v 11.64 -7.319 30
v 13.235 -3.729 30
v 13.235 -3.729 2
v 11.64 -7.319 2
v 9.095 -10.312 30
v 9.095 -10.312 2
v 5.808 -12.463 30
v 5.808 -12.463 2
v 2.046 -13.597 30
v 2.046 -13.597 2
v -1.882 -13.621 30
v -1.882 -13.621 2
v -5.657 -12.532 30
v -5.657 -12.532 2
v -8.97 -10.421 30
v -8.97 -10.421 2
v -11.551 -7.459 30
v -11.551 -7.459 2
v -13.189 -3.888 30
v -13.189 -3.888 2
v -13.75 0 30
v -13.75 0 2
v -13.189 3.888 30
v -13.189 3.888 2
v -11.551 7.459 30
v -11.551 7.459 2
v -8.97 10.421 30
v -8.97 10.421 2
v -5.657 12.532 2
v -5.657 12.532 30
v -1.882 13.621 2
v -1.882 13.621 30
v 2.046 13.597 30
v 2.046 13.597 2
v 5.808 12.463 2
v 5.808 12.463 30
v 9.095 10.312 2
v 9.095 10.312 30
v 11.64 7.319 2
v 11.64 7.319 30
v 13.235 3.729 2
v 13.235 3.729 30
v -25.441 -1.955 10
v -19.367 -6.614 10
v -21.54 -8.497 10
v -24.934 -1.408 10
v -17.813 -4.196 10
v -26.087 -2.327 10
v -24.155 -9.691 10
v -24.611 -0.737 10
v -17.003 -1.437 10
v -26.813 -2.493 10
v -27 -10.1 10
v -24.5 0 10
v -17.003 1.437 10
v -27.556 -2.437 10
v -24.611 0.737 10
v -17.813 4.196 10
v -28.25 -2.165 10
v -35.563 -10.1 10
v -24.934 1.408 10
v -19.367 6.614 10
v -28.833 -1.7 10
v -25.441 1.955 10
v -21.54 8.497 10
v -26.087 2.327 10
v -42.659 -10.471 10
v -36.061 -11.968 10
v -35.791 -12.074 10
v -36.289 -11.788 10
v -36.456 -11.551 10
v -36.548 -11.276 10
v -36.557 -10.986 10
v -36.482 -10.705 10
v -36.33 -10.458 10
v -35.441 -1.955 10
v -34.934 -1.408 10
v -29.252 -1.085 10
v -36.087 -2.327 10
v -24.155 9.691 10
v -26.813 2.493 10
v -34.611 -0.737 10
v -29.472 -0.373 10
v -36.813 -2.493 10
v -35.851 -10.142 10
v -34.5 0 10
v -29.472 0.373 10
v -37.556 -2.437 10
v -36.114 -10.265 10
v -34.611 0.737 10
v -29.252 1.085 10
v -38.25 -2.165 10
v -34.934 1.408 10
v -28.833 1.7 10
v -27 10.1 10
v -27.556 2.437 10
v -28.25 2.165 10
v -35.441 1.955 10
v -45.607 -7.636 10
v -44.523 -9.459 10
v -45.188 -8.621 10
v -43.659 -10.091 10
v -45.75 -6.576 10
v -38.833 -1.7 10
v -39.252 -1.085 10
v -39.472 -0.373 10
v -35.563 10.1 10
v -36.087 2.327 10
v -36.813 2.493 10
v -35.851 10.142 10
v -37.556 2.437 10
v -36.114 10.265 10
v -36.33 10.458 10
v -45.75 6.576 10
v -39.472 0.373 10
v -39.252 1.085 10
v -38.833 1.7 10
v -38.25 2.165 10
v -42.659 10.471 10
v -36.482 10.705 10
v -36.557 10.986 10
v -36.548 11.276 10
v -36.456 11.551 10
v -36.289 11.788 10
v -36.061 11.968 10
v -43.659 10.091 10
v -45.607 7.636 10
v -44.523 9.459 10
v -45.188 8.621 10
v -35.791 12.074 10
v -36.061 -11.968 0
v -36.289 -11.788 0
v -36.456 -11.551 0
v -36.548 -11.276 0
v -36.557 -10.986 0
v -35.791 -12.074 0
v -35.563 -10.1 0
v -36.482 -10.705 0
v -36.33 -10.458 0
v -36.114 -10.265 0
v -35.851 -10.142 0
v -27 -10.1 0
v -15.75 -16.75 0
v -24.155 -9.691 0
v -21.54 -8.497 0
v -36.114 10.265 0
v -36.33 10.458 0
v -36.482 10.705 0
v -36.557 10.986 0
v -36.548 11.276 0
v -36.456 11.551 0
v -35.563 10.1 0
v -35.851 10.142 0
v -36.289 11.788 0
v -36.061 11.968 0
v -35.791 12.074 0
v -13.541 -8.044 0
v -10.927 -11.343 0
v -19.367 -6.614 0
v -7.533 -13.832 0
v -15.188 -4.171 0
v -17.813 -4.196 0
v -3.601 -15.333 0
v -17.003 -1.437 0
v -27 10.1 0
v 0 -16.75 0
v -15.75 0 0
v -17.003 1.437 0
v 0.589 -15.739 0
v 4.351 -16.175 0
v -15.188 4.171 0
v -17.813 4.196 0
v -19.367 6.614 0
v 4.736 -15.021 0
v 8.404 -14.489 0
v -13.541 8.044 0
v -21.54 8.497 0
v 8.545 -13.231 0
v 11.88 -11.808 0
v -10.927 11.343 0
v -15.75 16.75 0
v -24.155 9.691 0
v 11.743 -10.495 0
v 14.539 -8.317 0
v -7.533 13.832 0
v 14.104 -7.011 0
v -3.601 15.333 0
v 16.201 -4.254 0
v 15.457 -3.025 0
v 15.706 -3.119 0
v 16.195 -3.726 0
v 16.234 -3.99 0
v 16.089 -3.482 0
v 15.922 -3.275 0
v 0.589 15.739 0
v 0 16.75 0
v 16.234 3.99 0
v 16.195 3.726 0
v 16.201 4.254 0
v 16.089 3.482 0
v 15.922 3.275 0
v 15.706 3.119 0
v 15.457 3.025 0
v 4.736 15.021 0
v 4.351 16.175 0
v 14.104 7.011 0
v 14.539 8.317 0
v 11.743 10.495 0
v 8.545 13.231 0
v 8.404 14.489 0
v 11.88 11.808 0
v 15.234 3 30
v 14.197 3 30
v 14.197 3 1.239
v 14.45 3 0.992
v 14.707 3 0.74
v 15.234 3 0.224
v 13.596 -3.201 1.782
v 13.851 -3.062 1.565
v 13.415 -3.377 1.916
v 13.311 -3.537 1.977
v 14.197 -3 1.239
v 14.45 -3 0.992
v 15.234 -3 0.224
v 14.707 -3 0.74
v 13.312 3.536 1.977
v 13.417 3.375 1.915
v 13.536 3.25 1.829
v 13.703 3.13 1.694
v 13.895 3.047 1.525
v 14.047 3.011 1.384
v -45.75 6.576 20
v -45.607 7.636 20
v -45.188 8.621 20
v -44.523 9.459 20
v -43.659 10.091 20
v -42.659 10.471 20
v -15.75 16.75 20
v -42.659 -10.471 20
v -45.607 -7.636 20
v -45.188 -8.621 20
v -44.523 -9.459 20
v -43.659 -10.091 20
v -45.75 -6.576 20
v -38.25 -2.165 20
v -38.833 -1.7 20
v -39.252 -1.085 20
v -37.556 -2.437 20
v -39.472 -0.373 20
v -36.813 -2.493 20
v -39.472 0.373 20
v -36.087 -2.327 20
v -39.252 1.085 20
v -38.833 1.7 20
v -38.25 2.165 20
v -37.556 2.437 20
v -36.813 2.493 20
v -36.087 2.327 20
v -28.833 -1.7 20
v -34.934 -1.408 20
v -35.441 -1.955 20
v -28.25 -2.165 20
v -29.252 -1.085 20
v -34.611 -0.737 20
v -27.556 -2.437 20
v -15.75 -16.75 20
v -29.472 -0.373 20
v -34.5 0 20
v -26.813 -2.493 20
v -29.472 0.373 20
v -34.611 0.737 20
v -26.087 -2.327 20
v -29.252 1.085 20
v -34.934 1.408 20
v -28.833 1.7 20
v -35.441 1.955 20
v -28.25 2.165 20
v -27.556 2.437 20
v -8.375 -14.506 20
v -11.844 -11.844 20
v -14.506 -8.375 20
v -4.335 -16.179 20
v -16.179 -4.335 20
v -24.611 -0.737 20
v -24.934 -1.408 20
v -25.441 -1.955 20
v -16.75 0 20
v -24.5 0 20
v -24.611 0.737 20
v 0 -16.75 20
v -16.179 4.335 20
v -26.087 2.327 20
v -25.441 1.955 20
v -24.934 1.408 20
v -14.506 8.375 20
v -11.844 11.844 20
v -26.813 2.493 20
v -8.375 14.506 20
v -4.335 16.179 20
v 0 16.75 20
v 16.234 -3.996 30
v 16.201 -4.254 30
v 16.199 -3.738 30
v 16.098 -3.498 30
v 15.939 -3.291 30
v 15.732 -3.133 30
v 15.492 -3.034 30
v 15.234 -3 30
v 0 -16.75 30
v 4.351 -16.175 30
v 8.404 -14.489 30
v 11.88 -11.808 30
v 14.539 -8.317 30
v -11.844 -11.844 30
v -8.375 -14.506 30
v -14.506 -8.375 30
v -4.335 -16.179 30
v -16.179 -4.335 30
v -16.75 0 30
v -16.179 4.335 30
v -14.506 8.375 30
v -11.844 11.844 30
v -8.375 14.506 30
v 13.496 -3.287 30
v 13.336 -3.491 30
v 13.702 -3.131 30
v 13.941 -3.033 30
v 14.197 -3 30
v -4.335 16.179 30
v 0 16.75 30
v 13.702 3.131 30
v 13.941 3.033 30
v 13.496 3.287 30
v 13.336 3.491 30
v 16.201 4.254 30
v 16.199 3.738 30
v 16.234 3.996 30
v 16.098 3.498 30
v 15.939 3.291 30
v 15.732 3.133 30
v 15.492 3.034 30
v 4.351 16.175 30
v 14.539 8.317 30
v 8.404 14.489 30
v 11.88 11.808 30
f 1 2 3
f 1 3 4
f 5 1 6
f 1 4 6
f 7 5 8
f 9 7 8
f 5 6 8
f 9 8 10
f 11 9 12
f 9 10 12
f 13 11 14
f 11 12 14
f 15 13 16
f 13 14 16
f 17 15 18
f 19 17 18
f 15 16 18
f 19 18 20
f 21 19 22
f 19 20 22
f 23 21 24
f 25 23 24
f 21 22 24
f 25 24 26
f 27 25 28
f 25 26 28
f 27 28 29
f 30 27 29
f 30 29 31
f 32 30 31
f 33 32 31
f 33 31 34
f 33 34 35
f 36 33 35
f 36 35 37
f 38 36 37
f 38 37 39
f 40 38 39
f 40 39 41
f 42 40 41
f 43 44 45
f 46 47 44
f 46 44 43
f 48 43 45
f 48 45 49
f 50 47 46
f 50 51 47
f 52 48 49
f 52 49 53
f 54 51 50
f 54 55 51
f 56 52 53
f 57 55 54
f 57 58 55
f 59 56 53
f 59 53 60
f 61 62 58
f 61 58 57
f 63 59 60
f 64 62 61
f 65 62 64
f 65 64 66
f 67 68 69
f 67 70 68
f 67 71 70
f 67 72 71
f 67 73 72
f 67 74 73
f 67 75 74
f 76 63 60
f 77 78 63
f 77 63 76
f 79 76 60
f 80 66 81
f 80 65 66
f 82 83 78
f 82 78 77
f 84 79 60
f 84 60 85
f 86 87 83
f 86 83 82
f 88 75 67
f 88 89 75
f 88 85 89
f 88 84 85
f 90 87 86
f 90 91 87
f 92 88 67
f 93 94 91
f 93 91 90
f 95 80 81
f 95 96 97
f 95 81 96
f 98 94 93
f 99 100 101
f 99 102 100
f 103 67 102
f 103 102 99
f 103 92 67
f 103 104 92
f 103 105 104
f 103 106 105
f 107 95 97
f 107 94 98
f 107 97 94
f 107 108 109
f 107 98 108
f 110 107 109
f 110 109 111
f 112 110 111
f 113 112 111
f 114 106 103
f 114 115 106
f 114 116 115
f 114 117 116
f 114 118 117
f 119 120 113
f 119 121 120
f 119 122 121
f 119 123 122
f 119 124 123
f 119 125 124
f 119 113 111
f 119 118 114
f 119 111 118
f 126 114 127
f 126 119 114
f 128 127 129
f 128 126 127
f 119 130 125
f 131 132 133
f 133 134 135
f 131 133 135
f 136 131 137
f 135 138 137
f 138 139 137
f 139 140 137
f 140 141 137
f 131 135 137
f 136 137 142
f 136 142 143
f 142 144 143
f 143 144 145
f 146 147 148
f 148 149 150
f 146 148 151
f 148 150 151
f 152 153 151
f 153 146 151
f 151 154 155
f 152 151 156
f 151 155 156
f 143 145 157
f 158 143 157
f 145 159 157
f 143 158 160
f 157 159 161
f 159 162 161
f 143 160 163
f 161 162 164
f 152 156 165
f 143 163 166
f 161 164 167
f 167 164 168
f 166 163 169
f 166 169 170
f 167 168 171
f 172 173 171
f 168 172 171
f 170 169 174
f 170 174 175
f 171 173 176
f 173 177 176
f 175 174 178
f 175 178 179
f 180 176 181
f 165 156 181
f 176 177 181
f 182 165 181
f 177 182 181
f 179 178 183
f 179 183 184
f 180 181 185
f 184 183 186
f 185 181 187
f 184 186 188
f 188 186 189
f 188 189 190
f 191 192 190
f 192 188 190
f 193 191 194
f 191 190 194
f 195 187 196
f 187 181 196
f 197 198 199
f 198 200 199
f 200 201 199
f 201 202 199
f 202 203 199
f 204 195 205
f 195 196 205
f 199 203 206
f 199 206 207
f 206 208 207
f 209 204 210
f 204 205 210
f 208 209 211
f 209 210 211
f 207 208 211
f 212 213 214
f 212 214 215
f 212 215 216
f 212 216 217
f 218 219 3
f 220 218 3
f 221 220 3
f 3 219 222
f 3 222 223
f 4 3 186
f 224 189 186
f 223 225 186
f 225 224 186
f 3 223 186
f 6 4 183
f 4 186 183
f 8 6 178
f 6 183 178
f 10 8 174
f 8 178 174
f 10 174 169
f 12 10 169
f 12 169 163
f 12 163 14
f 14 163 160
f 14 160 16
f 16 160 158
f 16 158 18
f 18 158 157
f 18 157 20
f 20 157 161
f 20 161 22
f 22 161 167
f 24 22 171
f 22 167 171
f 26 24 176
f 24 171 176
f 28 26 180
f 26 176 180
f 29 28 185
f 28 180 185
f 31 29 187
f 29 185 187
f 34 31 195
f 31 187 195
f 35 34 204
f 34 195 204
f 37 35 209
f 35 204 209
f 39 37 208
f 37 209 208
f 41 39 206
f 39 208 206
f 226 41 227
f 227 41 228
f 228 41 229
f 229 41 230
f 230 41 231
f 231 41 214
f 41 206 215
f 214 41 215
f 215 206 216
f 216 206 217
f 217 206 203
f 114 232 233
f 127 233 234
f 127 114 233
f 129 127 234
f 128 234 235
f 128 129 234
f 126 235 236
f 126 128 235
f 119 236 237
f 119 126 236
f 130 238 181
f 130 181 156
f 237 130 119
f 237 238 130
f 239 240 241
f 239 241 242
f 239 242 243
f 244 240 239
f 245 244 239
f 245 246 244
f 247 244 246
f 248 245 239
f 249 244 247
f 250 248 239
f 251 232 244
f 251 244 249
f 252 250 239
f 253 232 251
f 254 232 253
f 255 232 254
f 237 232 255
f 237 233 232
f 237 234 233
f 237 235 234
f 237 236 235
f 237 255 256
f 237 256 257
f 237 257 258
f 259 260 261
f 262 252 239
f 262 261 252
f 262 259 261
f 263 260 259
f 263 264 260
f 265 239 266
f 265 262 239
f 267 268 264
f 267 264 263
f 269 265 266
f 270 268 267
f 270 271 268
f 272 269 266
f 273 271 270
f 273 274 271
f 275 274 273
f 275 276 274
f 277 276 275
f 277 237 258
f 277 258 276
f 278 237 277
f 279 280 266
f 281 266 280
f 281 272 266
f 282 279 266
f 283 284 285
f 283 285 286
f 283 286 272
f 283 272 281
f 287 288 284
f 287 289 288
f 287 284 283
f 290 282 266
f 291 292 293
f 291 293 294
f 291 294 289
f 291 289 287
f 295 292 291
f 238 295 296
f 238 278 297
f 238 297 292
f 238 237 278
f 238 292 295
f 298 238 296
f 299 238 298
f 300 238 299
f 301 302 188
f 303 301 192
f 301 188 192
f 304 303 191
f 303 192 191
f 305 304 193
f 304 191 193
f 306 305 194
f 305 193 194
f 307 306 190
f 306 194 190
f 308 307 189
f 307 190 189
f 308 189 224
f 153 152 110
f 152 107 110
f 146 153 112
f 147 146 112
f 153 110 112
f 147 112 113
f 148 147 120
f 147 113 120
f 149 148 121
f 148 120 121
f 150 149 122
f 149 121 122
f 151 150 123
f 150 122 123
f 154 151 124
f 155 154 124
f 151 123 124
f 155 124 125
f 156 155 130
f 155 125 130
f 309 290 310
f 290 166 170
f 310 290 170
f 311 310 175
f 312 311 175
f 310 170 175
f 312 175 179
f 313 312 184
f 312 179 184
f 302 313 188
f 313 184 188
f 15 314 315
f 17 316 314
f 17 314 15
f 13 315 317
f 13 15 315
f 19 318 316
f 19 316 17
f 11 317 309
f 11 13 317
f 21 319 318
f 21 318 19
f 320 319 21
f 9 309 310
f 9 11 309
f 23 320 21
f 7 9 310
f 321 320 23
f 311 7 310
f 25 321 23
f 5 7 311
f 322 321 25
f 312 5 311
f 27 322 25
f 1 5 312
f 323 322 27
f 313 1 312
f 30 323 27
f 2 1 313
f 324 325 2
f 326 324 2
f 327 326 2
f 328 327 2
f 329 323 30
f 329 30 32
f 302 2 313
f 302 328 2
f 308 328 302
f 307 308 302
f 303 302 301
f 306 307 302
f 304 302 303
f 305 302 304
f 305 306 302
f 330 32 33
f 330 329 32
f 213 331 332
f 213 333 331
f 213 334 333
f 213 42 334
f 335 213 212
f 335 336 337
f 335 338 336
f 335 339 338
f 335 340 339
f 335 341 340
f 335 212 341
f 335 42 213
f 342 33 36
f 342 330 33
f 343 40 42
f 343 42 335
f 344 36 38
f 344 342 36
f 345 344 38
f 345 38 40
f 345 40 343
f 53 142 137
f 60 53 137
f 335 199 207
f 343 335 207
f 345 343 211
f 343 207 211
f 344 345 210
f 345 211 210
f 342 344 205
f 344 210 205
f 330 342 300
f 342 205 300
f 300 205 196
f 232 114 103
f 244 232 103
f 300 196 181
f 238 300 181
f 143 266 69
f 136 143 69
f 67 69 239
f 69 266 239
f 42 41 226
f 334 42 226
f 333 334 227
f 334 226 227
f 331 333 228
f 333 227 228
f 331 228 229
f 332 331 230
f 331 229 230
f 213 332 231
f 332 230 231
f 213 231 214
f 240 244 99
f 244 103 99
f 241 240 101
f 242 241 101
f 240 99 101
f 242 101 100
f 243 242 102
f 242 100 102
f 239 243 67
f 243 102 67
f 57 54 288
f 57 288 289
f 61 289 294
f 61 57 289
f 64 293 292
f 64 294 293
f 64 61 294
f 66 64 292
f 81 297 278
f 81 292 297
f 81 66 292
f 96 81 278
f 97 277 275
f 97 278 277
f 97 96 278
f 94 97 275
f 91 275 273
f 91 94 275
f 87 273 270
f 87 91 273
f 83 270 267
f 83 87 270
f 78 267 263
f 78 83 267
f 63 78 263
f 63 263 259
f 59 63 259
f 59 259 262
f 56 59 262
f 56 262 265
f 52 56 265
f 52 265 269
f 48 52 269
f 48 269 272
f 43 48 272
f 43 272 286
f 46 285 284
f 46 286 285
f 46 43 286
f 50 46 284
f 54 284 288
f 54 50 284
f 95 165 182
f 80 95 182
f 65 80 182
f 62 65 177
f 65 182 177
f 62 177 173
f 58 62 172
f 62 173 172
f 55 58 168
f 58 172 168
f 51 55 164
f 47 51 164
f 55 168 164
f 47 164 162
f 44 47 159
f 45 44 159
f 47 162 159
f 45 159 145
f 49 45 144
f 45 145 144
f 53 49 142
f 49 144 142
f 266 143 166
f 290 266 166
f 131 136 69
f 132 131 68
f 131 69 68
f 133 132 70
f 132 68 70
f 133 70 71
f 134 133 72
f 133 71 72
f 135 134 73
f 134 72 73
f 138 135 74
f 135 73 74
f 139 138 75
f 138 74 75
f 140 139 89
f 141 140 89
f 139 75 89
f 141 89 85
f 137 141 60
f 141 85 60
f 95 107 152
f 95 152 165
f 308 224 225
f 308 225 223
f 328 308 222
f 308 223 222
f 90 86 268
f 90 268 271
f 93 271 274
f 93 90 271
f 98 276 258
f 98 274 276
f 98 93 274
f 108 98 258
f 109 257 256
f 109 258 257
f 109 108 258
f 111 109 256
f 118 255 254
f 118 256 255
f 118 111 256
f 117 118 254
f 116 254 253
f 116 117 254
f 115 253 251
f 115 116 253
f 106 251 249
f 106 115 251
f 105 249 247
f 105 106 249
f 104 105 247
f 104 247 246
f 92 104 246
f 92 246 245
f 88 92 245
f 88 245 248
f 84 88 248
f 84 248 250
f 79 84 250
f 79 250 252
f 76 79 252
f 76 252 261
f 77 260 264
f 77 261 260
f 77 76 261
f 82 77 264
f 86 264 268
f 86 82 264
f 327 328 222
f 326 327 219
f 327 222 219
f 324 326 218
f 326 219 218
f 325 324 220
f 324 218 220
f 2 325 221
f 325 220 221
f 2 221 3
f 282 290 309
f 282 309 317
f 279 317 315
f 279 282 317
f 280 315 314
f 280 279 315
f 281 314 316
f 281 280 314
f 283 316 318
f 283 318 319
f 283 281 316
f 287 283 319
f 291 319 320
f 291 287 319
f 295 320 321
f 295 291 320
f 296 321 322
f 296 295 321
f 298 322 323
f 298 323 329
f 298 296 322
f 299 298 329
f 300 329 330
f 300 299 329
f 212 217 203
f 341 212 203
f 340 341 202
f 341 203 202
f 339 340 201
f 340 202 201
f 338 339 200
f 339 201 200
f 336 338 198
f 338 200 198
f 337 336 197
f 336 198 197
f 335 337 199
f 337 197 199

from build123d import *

# Parameters (mm, degrees)
ESQUISSE1_R             = 2.5
BOSS_EXTRU_1_DEPTH      = 30
CHANFREIN1_SIZE         = 2
CONG_2_R                = 1
ENL_V_MAT_EXTRU_1_DEPTH = 10
ENL_V_START             = -10
ENL_V_MAT_EXTRU_2_DEPTH = 10
ENL_V_MAT_EXTRU_3_DEPTH = 53.665216263
CONG_3_R                = 1
CONG_4_R                = 4


with BuildPart() as part:
    # Esquisse1 → Boss.-Extru.1 (new body)
    with BuildSketch(Plane.XY):
        with BuildLine():
            Line((13.4187369, 3), (16.479153498, 3))
            ThreePointArc((16.479153498, 3), (10.731088016, 12.861036117), (0, 16.75))
            Line((0, 16.75), (-45.75, 16.75))
            Line((-45.75, 16.75), (-45.75, -16.75))
            Line((-45.75, -16.75), (0, -16.75))
            ThreePointArc((0, -16.75), (10.731088016, -12.861036117), (16.479153498, -3))
            Line((16.479153498, -3), (13.4187369, -3))
            ThreePointArc((13.4187369, -3), (-13.75, 0), (13.4187369, 3))
        make_face()
        with Locations((-37, 0)):
            Circle(ESQUISSE1_R, mode=Mode.SUBTRACT)
        with Locations((-27, 0)):
            Circle(ESQUISSE1_R, mode=Mode.SUBTRACT)
    extrude(amount=BOSS_EXTRU_1_DEPTH)

    # Chanfrein1
    chanfrein1_edges = [part.edges().sort_by_distance(p)[0] for p in [
        (-13.75, 0, 0),
    ]]
    chamfer(chanfrein1_edges, length=CHANFREIN1_SIZE)

    # Congé2
    # the kernel refuses this fillet: 1 mm, written as the material it takes off along each edge
    with BuildSketch(Plane(origin=(16.479153498, -3, -3.211221849), x_dir=(-1, 0, 0), z_dir=(0, 0, 1))) as cong_2_piece_1:
        with BuildLine():
            CenterArc((1.245555761, 1), CONG_2_R, 165.287542039, 104.712457961)
            ThreePointArc((0.278343206, 1.253968254), (0.127146972, 0.629653233), (0, 0))
            Line((0, 0), (1.245555761, 0))
        make_face()
    extrude(amount=36.422443699, mode=Mode.SUBTRACT)
    with BuildSketch(Plane(origin=(16.479153498, 3, -3.211221849), x_dir=(-1, 0, 0), z_dir=(0, 0, 1))) as cong_2_piece_2:
        with BuildLine():
            CenterArc((1.245555761, -1), CONG_2_R, 90, 104.712457961)
            ThreePointArc((0.278343206, -1.253968254), (0.127146972, -0.629653233), (0, 0))
            Line((0, 0), (1.245555761, 0))
        make_face()
    extrude(amount=36.422443699, mode=Mode.SUBTRACT)
    with BuildSketch(Plane(origin=(13.4187369, -3, 0.05366509), x_dir=(1, 0, 0), z_dir=(0, 0, 1))) as cong_2_piece_3:
        with BuildLine():
            CenterArc((0.778533964, -1), CONG_2_R, 90, 74.265120821)
            ThreePointArc((-0.183992874, -0.728813559), (-0.087015193, -0.365664321), (0, 0))
            Line((0, 0), (0.778533964, 0))
        make_face()
    extrude(amount=31.892669821, mode=Mode.SUBTRACT)
    with BuildSketch(Plane(origin=(13.4187369, 3, 0.05366509), x_dir=(-0.24477558700132723, 0.9695797605190384, 0), z_dir=(0, 0, 1))) as cong_2_piece_4:
        with BuildLine():
            CenterArc((0.779013652, -0.999626362), CONG_2_R, 91.566307169, 74.265120821)
            Line((-0.190566108, -0.754850775), (0, 0))
            ThreePointArc((0, 0), (0.37583992, -0.005137529), (0.75167984, 0))
        make_face()
    extrude(amount=31.892669821, mode=Mode.SUBTRACT)

    # Esquisse2 → Enlèv. mat.-Extru.1 (cut)
    with BuildSketch(Plane(origin=(0, 0, 0), x_dir=(-1, 0, 0), z_dir=(0, 0, -1))):
        with BuildLine():
            Line((45.75, 10.1), (27, 10.1))
            ThreePointArc((27, 10.1), (16.9, 0), (27, -10.1))
            Line((27, -10.1), (45.75, -10.1))
            Line((45.75, -10.1), (45.75, 10.1))
        make_face()
    extrude(amount=-ENL_V_MAT_EXTRU_1_DEPTH, mode=Mode.SUBTRACT)

    # Esquisse3 → Enlèv. mat.-Extru.2 (cut)
    with BuildSketch(Plane.XY.offset(30).offset(ENL_V_START)):
        with BuildLine():
            Line((0, 16.75), (-45.75, 16.75))
            Line((-45.75, 16.75), (-45.75, -16.75))
            Line((-45.75, -16.75), (0, -16.75))
            ThreePointArc((0, -16.75), (-16.75, 0), (0, 16.75))
        make_face()
    extrude(amount=ENL_V_MAT_EXTRU_2_DEPTH, mode=Mode.SUBTRACT)

    # Esquisse5 → Enlèv. mat.-Extru.3 (cut, through all)
    with BuildSketch(Plane.XY.offset(20)):
        Polygon((-15.75, 16.75), (-45.75, 9.75), (-45.75, 16.75), align=None)
        Polygon((-45.75, -16.75), (-15.75, -16.75), (-45.75, -9.75), align=None)
    extrude(amount=-ENL_V_MAT_EXTRU_3_DEPTH, mode=Mode.SUBTRACT)

    # Congé3
    cong_3_edges = [part.edges().sort_by_distance(p)[0] for p in [
        (-44.25, 10.1, 5),
        (-44.25, -10.1, 5),
    ]]
    fillet(cong_3_edges, radius=CONG_3_R)

    # Congé4
    cong_4_edges = [part.edges().sort_by_distance(p)[0] for p in [
        (-45.75, 9.75, 15),
        (-45.75, -9.75, 15),
    ]]
    fillet(cong_4_edges, radius=CONG_4_R)


solid = part.part
